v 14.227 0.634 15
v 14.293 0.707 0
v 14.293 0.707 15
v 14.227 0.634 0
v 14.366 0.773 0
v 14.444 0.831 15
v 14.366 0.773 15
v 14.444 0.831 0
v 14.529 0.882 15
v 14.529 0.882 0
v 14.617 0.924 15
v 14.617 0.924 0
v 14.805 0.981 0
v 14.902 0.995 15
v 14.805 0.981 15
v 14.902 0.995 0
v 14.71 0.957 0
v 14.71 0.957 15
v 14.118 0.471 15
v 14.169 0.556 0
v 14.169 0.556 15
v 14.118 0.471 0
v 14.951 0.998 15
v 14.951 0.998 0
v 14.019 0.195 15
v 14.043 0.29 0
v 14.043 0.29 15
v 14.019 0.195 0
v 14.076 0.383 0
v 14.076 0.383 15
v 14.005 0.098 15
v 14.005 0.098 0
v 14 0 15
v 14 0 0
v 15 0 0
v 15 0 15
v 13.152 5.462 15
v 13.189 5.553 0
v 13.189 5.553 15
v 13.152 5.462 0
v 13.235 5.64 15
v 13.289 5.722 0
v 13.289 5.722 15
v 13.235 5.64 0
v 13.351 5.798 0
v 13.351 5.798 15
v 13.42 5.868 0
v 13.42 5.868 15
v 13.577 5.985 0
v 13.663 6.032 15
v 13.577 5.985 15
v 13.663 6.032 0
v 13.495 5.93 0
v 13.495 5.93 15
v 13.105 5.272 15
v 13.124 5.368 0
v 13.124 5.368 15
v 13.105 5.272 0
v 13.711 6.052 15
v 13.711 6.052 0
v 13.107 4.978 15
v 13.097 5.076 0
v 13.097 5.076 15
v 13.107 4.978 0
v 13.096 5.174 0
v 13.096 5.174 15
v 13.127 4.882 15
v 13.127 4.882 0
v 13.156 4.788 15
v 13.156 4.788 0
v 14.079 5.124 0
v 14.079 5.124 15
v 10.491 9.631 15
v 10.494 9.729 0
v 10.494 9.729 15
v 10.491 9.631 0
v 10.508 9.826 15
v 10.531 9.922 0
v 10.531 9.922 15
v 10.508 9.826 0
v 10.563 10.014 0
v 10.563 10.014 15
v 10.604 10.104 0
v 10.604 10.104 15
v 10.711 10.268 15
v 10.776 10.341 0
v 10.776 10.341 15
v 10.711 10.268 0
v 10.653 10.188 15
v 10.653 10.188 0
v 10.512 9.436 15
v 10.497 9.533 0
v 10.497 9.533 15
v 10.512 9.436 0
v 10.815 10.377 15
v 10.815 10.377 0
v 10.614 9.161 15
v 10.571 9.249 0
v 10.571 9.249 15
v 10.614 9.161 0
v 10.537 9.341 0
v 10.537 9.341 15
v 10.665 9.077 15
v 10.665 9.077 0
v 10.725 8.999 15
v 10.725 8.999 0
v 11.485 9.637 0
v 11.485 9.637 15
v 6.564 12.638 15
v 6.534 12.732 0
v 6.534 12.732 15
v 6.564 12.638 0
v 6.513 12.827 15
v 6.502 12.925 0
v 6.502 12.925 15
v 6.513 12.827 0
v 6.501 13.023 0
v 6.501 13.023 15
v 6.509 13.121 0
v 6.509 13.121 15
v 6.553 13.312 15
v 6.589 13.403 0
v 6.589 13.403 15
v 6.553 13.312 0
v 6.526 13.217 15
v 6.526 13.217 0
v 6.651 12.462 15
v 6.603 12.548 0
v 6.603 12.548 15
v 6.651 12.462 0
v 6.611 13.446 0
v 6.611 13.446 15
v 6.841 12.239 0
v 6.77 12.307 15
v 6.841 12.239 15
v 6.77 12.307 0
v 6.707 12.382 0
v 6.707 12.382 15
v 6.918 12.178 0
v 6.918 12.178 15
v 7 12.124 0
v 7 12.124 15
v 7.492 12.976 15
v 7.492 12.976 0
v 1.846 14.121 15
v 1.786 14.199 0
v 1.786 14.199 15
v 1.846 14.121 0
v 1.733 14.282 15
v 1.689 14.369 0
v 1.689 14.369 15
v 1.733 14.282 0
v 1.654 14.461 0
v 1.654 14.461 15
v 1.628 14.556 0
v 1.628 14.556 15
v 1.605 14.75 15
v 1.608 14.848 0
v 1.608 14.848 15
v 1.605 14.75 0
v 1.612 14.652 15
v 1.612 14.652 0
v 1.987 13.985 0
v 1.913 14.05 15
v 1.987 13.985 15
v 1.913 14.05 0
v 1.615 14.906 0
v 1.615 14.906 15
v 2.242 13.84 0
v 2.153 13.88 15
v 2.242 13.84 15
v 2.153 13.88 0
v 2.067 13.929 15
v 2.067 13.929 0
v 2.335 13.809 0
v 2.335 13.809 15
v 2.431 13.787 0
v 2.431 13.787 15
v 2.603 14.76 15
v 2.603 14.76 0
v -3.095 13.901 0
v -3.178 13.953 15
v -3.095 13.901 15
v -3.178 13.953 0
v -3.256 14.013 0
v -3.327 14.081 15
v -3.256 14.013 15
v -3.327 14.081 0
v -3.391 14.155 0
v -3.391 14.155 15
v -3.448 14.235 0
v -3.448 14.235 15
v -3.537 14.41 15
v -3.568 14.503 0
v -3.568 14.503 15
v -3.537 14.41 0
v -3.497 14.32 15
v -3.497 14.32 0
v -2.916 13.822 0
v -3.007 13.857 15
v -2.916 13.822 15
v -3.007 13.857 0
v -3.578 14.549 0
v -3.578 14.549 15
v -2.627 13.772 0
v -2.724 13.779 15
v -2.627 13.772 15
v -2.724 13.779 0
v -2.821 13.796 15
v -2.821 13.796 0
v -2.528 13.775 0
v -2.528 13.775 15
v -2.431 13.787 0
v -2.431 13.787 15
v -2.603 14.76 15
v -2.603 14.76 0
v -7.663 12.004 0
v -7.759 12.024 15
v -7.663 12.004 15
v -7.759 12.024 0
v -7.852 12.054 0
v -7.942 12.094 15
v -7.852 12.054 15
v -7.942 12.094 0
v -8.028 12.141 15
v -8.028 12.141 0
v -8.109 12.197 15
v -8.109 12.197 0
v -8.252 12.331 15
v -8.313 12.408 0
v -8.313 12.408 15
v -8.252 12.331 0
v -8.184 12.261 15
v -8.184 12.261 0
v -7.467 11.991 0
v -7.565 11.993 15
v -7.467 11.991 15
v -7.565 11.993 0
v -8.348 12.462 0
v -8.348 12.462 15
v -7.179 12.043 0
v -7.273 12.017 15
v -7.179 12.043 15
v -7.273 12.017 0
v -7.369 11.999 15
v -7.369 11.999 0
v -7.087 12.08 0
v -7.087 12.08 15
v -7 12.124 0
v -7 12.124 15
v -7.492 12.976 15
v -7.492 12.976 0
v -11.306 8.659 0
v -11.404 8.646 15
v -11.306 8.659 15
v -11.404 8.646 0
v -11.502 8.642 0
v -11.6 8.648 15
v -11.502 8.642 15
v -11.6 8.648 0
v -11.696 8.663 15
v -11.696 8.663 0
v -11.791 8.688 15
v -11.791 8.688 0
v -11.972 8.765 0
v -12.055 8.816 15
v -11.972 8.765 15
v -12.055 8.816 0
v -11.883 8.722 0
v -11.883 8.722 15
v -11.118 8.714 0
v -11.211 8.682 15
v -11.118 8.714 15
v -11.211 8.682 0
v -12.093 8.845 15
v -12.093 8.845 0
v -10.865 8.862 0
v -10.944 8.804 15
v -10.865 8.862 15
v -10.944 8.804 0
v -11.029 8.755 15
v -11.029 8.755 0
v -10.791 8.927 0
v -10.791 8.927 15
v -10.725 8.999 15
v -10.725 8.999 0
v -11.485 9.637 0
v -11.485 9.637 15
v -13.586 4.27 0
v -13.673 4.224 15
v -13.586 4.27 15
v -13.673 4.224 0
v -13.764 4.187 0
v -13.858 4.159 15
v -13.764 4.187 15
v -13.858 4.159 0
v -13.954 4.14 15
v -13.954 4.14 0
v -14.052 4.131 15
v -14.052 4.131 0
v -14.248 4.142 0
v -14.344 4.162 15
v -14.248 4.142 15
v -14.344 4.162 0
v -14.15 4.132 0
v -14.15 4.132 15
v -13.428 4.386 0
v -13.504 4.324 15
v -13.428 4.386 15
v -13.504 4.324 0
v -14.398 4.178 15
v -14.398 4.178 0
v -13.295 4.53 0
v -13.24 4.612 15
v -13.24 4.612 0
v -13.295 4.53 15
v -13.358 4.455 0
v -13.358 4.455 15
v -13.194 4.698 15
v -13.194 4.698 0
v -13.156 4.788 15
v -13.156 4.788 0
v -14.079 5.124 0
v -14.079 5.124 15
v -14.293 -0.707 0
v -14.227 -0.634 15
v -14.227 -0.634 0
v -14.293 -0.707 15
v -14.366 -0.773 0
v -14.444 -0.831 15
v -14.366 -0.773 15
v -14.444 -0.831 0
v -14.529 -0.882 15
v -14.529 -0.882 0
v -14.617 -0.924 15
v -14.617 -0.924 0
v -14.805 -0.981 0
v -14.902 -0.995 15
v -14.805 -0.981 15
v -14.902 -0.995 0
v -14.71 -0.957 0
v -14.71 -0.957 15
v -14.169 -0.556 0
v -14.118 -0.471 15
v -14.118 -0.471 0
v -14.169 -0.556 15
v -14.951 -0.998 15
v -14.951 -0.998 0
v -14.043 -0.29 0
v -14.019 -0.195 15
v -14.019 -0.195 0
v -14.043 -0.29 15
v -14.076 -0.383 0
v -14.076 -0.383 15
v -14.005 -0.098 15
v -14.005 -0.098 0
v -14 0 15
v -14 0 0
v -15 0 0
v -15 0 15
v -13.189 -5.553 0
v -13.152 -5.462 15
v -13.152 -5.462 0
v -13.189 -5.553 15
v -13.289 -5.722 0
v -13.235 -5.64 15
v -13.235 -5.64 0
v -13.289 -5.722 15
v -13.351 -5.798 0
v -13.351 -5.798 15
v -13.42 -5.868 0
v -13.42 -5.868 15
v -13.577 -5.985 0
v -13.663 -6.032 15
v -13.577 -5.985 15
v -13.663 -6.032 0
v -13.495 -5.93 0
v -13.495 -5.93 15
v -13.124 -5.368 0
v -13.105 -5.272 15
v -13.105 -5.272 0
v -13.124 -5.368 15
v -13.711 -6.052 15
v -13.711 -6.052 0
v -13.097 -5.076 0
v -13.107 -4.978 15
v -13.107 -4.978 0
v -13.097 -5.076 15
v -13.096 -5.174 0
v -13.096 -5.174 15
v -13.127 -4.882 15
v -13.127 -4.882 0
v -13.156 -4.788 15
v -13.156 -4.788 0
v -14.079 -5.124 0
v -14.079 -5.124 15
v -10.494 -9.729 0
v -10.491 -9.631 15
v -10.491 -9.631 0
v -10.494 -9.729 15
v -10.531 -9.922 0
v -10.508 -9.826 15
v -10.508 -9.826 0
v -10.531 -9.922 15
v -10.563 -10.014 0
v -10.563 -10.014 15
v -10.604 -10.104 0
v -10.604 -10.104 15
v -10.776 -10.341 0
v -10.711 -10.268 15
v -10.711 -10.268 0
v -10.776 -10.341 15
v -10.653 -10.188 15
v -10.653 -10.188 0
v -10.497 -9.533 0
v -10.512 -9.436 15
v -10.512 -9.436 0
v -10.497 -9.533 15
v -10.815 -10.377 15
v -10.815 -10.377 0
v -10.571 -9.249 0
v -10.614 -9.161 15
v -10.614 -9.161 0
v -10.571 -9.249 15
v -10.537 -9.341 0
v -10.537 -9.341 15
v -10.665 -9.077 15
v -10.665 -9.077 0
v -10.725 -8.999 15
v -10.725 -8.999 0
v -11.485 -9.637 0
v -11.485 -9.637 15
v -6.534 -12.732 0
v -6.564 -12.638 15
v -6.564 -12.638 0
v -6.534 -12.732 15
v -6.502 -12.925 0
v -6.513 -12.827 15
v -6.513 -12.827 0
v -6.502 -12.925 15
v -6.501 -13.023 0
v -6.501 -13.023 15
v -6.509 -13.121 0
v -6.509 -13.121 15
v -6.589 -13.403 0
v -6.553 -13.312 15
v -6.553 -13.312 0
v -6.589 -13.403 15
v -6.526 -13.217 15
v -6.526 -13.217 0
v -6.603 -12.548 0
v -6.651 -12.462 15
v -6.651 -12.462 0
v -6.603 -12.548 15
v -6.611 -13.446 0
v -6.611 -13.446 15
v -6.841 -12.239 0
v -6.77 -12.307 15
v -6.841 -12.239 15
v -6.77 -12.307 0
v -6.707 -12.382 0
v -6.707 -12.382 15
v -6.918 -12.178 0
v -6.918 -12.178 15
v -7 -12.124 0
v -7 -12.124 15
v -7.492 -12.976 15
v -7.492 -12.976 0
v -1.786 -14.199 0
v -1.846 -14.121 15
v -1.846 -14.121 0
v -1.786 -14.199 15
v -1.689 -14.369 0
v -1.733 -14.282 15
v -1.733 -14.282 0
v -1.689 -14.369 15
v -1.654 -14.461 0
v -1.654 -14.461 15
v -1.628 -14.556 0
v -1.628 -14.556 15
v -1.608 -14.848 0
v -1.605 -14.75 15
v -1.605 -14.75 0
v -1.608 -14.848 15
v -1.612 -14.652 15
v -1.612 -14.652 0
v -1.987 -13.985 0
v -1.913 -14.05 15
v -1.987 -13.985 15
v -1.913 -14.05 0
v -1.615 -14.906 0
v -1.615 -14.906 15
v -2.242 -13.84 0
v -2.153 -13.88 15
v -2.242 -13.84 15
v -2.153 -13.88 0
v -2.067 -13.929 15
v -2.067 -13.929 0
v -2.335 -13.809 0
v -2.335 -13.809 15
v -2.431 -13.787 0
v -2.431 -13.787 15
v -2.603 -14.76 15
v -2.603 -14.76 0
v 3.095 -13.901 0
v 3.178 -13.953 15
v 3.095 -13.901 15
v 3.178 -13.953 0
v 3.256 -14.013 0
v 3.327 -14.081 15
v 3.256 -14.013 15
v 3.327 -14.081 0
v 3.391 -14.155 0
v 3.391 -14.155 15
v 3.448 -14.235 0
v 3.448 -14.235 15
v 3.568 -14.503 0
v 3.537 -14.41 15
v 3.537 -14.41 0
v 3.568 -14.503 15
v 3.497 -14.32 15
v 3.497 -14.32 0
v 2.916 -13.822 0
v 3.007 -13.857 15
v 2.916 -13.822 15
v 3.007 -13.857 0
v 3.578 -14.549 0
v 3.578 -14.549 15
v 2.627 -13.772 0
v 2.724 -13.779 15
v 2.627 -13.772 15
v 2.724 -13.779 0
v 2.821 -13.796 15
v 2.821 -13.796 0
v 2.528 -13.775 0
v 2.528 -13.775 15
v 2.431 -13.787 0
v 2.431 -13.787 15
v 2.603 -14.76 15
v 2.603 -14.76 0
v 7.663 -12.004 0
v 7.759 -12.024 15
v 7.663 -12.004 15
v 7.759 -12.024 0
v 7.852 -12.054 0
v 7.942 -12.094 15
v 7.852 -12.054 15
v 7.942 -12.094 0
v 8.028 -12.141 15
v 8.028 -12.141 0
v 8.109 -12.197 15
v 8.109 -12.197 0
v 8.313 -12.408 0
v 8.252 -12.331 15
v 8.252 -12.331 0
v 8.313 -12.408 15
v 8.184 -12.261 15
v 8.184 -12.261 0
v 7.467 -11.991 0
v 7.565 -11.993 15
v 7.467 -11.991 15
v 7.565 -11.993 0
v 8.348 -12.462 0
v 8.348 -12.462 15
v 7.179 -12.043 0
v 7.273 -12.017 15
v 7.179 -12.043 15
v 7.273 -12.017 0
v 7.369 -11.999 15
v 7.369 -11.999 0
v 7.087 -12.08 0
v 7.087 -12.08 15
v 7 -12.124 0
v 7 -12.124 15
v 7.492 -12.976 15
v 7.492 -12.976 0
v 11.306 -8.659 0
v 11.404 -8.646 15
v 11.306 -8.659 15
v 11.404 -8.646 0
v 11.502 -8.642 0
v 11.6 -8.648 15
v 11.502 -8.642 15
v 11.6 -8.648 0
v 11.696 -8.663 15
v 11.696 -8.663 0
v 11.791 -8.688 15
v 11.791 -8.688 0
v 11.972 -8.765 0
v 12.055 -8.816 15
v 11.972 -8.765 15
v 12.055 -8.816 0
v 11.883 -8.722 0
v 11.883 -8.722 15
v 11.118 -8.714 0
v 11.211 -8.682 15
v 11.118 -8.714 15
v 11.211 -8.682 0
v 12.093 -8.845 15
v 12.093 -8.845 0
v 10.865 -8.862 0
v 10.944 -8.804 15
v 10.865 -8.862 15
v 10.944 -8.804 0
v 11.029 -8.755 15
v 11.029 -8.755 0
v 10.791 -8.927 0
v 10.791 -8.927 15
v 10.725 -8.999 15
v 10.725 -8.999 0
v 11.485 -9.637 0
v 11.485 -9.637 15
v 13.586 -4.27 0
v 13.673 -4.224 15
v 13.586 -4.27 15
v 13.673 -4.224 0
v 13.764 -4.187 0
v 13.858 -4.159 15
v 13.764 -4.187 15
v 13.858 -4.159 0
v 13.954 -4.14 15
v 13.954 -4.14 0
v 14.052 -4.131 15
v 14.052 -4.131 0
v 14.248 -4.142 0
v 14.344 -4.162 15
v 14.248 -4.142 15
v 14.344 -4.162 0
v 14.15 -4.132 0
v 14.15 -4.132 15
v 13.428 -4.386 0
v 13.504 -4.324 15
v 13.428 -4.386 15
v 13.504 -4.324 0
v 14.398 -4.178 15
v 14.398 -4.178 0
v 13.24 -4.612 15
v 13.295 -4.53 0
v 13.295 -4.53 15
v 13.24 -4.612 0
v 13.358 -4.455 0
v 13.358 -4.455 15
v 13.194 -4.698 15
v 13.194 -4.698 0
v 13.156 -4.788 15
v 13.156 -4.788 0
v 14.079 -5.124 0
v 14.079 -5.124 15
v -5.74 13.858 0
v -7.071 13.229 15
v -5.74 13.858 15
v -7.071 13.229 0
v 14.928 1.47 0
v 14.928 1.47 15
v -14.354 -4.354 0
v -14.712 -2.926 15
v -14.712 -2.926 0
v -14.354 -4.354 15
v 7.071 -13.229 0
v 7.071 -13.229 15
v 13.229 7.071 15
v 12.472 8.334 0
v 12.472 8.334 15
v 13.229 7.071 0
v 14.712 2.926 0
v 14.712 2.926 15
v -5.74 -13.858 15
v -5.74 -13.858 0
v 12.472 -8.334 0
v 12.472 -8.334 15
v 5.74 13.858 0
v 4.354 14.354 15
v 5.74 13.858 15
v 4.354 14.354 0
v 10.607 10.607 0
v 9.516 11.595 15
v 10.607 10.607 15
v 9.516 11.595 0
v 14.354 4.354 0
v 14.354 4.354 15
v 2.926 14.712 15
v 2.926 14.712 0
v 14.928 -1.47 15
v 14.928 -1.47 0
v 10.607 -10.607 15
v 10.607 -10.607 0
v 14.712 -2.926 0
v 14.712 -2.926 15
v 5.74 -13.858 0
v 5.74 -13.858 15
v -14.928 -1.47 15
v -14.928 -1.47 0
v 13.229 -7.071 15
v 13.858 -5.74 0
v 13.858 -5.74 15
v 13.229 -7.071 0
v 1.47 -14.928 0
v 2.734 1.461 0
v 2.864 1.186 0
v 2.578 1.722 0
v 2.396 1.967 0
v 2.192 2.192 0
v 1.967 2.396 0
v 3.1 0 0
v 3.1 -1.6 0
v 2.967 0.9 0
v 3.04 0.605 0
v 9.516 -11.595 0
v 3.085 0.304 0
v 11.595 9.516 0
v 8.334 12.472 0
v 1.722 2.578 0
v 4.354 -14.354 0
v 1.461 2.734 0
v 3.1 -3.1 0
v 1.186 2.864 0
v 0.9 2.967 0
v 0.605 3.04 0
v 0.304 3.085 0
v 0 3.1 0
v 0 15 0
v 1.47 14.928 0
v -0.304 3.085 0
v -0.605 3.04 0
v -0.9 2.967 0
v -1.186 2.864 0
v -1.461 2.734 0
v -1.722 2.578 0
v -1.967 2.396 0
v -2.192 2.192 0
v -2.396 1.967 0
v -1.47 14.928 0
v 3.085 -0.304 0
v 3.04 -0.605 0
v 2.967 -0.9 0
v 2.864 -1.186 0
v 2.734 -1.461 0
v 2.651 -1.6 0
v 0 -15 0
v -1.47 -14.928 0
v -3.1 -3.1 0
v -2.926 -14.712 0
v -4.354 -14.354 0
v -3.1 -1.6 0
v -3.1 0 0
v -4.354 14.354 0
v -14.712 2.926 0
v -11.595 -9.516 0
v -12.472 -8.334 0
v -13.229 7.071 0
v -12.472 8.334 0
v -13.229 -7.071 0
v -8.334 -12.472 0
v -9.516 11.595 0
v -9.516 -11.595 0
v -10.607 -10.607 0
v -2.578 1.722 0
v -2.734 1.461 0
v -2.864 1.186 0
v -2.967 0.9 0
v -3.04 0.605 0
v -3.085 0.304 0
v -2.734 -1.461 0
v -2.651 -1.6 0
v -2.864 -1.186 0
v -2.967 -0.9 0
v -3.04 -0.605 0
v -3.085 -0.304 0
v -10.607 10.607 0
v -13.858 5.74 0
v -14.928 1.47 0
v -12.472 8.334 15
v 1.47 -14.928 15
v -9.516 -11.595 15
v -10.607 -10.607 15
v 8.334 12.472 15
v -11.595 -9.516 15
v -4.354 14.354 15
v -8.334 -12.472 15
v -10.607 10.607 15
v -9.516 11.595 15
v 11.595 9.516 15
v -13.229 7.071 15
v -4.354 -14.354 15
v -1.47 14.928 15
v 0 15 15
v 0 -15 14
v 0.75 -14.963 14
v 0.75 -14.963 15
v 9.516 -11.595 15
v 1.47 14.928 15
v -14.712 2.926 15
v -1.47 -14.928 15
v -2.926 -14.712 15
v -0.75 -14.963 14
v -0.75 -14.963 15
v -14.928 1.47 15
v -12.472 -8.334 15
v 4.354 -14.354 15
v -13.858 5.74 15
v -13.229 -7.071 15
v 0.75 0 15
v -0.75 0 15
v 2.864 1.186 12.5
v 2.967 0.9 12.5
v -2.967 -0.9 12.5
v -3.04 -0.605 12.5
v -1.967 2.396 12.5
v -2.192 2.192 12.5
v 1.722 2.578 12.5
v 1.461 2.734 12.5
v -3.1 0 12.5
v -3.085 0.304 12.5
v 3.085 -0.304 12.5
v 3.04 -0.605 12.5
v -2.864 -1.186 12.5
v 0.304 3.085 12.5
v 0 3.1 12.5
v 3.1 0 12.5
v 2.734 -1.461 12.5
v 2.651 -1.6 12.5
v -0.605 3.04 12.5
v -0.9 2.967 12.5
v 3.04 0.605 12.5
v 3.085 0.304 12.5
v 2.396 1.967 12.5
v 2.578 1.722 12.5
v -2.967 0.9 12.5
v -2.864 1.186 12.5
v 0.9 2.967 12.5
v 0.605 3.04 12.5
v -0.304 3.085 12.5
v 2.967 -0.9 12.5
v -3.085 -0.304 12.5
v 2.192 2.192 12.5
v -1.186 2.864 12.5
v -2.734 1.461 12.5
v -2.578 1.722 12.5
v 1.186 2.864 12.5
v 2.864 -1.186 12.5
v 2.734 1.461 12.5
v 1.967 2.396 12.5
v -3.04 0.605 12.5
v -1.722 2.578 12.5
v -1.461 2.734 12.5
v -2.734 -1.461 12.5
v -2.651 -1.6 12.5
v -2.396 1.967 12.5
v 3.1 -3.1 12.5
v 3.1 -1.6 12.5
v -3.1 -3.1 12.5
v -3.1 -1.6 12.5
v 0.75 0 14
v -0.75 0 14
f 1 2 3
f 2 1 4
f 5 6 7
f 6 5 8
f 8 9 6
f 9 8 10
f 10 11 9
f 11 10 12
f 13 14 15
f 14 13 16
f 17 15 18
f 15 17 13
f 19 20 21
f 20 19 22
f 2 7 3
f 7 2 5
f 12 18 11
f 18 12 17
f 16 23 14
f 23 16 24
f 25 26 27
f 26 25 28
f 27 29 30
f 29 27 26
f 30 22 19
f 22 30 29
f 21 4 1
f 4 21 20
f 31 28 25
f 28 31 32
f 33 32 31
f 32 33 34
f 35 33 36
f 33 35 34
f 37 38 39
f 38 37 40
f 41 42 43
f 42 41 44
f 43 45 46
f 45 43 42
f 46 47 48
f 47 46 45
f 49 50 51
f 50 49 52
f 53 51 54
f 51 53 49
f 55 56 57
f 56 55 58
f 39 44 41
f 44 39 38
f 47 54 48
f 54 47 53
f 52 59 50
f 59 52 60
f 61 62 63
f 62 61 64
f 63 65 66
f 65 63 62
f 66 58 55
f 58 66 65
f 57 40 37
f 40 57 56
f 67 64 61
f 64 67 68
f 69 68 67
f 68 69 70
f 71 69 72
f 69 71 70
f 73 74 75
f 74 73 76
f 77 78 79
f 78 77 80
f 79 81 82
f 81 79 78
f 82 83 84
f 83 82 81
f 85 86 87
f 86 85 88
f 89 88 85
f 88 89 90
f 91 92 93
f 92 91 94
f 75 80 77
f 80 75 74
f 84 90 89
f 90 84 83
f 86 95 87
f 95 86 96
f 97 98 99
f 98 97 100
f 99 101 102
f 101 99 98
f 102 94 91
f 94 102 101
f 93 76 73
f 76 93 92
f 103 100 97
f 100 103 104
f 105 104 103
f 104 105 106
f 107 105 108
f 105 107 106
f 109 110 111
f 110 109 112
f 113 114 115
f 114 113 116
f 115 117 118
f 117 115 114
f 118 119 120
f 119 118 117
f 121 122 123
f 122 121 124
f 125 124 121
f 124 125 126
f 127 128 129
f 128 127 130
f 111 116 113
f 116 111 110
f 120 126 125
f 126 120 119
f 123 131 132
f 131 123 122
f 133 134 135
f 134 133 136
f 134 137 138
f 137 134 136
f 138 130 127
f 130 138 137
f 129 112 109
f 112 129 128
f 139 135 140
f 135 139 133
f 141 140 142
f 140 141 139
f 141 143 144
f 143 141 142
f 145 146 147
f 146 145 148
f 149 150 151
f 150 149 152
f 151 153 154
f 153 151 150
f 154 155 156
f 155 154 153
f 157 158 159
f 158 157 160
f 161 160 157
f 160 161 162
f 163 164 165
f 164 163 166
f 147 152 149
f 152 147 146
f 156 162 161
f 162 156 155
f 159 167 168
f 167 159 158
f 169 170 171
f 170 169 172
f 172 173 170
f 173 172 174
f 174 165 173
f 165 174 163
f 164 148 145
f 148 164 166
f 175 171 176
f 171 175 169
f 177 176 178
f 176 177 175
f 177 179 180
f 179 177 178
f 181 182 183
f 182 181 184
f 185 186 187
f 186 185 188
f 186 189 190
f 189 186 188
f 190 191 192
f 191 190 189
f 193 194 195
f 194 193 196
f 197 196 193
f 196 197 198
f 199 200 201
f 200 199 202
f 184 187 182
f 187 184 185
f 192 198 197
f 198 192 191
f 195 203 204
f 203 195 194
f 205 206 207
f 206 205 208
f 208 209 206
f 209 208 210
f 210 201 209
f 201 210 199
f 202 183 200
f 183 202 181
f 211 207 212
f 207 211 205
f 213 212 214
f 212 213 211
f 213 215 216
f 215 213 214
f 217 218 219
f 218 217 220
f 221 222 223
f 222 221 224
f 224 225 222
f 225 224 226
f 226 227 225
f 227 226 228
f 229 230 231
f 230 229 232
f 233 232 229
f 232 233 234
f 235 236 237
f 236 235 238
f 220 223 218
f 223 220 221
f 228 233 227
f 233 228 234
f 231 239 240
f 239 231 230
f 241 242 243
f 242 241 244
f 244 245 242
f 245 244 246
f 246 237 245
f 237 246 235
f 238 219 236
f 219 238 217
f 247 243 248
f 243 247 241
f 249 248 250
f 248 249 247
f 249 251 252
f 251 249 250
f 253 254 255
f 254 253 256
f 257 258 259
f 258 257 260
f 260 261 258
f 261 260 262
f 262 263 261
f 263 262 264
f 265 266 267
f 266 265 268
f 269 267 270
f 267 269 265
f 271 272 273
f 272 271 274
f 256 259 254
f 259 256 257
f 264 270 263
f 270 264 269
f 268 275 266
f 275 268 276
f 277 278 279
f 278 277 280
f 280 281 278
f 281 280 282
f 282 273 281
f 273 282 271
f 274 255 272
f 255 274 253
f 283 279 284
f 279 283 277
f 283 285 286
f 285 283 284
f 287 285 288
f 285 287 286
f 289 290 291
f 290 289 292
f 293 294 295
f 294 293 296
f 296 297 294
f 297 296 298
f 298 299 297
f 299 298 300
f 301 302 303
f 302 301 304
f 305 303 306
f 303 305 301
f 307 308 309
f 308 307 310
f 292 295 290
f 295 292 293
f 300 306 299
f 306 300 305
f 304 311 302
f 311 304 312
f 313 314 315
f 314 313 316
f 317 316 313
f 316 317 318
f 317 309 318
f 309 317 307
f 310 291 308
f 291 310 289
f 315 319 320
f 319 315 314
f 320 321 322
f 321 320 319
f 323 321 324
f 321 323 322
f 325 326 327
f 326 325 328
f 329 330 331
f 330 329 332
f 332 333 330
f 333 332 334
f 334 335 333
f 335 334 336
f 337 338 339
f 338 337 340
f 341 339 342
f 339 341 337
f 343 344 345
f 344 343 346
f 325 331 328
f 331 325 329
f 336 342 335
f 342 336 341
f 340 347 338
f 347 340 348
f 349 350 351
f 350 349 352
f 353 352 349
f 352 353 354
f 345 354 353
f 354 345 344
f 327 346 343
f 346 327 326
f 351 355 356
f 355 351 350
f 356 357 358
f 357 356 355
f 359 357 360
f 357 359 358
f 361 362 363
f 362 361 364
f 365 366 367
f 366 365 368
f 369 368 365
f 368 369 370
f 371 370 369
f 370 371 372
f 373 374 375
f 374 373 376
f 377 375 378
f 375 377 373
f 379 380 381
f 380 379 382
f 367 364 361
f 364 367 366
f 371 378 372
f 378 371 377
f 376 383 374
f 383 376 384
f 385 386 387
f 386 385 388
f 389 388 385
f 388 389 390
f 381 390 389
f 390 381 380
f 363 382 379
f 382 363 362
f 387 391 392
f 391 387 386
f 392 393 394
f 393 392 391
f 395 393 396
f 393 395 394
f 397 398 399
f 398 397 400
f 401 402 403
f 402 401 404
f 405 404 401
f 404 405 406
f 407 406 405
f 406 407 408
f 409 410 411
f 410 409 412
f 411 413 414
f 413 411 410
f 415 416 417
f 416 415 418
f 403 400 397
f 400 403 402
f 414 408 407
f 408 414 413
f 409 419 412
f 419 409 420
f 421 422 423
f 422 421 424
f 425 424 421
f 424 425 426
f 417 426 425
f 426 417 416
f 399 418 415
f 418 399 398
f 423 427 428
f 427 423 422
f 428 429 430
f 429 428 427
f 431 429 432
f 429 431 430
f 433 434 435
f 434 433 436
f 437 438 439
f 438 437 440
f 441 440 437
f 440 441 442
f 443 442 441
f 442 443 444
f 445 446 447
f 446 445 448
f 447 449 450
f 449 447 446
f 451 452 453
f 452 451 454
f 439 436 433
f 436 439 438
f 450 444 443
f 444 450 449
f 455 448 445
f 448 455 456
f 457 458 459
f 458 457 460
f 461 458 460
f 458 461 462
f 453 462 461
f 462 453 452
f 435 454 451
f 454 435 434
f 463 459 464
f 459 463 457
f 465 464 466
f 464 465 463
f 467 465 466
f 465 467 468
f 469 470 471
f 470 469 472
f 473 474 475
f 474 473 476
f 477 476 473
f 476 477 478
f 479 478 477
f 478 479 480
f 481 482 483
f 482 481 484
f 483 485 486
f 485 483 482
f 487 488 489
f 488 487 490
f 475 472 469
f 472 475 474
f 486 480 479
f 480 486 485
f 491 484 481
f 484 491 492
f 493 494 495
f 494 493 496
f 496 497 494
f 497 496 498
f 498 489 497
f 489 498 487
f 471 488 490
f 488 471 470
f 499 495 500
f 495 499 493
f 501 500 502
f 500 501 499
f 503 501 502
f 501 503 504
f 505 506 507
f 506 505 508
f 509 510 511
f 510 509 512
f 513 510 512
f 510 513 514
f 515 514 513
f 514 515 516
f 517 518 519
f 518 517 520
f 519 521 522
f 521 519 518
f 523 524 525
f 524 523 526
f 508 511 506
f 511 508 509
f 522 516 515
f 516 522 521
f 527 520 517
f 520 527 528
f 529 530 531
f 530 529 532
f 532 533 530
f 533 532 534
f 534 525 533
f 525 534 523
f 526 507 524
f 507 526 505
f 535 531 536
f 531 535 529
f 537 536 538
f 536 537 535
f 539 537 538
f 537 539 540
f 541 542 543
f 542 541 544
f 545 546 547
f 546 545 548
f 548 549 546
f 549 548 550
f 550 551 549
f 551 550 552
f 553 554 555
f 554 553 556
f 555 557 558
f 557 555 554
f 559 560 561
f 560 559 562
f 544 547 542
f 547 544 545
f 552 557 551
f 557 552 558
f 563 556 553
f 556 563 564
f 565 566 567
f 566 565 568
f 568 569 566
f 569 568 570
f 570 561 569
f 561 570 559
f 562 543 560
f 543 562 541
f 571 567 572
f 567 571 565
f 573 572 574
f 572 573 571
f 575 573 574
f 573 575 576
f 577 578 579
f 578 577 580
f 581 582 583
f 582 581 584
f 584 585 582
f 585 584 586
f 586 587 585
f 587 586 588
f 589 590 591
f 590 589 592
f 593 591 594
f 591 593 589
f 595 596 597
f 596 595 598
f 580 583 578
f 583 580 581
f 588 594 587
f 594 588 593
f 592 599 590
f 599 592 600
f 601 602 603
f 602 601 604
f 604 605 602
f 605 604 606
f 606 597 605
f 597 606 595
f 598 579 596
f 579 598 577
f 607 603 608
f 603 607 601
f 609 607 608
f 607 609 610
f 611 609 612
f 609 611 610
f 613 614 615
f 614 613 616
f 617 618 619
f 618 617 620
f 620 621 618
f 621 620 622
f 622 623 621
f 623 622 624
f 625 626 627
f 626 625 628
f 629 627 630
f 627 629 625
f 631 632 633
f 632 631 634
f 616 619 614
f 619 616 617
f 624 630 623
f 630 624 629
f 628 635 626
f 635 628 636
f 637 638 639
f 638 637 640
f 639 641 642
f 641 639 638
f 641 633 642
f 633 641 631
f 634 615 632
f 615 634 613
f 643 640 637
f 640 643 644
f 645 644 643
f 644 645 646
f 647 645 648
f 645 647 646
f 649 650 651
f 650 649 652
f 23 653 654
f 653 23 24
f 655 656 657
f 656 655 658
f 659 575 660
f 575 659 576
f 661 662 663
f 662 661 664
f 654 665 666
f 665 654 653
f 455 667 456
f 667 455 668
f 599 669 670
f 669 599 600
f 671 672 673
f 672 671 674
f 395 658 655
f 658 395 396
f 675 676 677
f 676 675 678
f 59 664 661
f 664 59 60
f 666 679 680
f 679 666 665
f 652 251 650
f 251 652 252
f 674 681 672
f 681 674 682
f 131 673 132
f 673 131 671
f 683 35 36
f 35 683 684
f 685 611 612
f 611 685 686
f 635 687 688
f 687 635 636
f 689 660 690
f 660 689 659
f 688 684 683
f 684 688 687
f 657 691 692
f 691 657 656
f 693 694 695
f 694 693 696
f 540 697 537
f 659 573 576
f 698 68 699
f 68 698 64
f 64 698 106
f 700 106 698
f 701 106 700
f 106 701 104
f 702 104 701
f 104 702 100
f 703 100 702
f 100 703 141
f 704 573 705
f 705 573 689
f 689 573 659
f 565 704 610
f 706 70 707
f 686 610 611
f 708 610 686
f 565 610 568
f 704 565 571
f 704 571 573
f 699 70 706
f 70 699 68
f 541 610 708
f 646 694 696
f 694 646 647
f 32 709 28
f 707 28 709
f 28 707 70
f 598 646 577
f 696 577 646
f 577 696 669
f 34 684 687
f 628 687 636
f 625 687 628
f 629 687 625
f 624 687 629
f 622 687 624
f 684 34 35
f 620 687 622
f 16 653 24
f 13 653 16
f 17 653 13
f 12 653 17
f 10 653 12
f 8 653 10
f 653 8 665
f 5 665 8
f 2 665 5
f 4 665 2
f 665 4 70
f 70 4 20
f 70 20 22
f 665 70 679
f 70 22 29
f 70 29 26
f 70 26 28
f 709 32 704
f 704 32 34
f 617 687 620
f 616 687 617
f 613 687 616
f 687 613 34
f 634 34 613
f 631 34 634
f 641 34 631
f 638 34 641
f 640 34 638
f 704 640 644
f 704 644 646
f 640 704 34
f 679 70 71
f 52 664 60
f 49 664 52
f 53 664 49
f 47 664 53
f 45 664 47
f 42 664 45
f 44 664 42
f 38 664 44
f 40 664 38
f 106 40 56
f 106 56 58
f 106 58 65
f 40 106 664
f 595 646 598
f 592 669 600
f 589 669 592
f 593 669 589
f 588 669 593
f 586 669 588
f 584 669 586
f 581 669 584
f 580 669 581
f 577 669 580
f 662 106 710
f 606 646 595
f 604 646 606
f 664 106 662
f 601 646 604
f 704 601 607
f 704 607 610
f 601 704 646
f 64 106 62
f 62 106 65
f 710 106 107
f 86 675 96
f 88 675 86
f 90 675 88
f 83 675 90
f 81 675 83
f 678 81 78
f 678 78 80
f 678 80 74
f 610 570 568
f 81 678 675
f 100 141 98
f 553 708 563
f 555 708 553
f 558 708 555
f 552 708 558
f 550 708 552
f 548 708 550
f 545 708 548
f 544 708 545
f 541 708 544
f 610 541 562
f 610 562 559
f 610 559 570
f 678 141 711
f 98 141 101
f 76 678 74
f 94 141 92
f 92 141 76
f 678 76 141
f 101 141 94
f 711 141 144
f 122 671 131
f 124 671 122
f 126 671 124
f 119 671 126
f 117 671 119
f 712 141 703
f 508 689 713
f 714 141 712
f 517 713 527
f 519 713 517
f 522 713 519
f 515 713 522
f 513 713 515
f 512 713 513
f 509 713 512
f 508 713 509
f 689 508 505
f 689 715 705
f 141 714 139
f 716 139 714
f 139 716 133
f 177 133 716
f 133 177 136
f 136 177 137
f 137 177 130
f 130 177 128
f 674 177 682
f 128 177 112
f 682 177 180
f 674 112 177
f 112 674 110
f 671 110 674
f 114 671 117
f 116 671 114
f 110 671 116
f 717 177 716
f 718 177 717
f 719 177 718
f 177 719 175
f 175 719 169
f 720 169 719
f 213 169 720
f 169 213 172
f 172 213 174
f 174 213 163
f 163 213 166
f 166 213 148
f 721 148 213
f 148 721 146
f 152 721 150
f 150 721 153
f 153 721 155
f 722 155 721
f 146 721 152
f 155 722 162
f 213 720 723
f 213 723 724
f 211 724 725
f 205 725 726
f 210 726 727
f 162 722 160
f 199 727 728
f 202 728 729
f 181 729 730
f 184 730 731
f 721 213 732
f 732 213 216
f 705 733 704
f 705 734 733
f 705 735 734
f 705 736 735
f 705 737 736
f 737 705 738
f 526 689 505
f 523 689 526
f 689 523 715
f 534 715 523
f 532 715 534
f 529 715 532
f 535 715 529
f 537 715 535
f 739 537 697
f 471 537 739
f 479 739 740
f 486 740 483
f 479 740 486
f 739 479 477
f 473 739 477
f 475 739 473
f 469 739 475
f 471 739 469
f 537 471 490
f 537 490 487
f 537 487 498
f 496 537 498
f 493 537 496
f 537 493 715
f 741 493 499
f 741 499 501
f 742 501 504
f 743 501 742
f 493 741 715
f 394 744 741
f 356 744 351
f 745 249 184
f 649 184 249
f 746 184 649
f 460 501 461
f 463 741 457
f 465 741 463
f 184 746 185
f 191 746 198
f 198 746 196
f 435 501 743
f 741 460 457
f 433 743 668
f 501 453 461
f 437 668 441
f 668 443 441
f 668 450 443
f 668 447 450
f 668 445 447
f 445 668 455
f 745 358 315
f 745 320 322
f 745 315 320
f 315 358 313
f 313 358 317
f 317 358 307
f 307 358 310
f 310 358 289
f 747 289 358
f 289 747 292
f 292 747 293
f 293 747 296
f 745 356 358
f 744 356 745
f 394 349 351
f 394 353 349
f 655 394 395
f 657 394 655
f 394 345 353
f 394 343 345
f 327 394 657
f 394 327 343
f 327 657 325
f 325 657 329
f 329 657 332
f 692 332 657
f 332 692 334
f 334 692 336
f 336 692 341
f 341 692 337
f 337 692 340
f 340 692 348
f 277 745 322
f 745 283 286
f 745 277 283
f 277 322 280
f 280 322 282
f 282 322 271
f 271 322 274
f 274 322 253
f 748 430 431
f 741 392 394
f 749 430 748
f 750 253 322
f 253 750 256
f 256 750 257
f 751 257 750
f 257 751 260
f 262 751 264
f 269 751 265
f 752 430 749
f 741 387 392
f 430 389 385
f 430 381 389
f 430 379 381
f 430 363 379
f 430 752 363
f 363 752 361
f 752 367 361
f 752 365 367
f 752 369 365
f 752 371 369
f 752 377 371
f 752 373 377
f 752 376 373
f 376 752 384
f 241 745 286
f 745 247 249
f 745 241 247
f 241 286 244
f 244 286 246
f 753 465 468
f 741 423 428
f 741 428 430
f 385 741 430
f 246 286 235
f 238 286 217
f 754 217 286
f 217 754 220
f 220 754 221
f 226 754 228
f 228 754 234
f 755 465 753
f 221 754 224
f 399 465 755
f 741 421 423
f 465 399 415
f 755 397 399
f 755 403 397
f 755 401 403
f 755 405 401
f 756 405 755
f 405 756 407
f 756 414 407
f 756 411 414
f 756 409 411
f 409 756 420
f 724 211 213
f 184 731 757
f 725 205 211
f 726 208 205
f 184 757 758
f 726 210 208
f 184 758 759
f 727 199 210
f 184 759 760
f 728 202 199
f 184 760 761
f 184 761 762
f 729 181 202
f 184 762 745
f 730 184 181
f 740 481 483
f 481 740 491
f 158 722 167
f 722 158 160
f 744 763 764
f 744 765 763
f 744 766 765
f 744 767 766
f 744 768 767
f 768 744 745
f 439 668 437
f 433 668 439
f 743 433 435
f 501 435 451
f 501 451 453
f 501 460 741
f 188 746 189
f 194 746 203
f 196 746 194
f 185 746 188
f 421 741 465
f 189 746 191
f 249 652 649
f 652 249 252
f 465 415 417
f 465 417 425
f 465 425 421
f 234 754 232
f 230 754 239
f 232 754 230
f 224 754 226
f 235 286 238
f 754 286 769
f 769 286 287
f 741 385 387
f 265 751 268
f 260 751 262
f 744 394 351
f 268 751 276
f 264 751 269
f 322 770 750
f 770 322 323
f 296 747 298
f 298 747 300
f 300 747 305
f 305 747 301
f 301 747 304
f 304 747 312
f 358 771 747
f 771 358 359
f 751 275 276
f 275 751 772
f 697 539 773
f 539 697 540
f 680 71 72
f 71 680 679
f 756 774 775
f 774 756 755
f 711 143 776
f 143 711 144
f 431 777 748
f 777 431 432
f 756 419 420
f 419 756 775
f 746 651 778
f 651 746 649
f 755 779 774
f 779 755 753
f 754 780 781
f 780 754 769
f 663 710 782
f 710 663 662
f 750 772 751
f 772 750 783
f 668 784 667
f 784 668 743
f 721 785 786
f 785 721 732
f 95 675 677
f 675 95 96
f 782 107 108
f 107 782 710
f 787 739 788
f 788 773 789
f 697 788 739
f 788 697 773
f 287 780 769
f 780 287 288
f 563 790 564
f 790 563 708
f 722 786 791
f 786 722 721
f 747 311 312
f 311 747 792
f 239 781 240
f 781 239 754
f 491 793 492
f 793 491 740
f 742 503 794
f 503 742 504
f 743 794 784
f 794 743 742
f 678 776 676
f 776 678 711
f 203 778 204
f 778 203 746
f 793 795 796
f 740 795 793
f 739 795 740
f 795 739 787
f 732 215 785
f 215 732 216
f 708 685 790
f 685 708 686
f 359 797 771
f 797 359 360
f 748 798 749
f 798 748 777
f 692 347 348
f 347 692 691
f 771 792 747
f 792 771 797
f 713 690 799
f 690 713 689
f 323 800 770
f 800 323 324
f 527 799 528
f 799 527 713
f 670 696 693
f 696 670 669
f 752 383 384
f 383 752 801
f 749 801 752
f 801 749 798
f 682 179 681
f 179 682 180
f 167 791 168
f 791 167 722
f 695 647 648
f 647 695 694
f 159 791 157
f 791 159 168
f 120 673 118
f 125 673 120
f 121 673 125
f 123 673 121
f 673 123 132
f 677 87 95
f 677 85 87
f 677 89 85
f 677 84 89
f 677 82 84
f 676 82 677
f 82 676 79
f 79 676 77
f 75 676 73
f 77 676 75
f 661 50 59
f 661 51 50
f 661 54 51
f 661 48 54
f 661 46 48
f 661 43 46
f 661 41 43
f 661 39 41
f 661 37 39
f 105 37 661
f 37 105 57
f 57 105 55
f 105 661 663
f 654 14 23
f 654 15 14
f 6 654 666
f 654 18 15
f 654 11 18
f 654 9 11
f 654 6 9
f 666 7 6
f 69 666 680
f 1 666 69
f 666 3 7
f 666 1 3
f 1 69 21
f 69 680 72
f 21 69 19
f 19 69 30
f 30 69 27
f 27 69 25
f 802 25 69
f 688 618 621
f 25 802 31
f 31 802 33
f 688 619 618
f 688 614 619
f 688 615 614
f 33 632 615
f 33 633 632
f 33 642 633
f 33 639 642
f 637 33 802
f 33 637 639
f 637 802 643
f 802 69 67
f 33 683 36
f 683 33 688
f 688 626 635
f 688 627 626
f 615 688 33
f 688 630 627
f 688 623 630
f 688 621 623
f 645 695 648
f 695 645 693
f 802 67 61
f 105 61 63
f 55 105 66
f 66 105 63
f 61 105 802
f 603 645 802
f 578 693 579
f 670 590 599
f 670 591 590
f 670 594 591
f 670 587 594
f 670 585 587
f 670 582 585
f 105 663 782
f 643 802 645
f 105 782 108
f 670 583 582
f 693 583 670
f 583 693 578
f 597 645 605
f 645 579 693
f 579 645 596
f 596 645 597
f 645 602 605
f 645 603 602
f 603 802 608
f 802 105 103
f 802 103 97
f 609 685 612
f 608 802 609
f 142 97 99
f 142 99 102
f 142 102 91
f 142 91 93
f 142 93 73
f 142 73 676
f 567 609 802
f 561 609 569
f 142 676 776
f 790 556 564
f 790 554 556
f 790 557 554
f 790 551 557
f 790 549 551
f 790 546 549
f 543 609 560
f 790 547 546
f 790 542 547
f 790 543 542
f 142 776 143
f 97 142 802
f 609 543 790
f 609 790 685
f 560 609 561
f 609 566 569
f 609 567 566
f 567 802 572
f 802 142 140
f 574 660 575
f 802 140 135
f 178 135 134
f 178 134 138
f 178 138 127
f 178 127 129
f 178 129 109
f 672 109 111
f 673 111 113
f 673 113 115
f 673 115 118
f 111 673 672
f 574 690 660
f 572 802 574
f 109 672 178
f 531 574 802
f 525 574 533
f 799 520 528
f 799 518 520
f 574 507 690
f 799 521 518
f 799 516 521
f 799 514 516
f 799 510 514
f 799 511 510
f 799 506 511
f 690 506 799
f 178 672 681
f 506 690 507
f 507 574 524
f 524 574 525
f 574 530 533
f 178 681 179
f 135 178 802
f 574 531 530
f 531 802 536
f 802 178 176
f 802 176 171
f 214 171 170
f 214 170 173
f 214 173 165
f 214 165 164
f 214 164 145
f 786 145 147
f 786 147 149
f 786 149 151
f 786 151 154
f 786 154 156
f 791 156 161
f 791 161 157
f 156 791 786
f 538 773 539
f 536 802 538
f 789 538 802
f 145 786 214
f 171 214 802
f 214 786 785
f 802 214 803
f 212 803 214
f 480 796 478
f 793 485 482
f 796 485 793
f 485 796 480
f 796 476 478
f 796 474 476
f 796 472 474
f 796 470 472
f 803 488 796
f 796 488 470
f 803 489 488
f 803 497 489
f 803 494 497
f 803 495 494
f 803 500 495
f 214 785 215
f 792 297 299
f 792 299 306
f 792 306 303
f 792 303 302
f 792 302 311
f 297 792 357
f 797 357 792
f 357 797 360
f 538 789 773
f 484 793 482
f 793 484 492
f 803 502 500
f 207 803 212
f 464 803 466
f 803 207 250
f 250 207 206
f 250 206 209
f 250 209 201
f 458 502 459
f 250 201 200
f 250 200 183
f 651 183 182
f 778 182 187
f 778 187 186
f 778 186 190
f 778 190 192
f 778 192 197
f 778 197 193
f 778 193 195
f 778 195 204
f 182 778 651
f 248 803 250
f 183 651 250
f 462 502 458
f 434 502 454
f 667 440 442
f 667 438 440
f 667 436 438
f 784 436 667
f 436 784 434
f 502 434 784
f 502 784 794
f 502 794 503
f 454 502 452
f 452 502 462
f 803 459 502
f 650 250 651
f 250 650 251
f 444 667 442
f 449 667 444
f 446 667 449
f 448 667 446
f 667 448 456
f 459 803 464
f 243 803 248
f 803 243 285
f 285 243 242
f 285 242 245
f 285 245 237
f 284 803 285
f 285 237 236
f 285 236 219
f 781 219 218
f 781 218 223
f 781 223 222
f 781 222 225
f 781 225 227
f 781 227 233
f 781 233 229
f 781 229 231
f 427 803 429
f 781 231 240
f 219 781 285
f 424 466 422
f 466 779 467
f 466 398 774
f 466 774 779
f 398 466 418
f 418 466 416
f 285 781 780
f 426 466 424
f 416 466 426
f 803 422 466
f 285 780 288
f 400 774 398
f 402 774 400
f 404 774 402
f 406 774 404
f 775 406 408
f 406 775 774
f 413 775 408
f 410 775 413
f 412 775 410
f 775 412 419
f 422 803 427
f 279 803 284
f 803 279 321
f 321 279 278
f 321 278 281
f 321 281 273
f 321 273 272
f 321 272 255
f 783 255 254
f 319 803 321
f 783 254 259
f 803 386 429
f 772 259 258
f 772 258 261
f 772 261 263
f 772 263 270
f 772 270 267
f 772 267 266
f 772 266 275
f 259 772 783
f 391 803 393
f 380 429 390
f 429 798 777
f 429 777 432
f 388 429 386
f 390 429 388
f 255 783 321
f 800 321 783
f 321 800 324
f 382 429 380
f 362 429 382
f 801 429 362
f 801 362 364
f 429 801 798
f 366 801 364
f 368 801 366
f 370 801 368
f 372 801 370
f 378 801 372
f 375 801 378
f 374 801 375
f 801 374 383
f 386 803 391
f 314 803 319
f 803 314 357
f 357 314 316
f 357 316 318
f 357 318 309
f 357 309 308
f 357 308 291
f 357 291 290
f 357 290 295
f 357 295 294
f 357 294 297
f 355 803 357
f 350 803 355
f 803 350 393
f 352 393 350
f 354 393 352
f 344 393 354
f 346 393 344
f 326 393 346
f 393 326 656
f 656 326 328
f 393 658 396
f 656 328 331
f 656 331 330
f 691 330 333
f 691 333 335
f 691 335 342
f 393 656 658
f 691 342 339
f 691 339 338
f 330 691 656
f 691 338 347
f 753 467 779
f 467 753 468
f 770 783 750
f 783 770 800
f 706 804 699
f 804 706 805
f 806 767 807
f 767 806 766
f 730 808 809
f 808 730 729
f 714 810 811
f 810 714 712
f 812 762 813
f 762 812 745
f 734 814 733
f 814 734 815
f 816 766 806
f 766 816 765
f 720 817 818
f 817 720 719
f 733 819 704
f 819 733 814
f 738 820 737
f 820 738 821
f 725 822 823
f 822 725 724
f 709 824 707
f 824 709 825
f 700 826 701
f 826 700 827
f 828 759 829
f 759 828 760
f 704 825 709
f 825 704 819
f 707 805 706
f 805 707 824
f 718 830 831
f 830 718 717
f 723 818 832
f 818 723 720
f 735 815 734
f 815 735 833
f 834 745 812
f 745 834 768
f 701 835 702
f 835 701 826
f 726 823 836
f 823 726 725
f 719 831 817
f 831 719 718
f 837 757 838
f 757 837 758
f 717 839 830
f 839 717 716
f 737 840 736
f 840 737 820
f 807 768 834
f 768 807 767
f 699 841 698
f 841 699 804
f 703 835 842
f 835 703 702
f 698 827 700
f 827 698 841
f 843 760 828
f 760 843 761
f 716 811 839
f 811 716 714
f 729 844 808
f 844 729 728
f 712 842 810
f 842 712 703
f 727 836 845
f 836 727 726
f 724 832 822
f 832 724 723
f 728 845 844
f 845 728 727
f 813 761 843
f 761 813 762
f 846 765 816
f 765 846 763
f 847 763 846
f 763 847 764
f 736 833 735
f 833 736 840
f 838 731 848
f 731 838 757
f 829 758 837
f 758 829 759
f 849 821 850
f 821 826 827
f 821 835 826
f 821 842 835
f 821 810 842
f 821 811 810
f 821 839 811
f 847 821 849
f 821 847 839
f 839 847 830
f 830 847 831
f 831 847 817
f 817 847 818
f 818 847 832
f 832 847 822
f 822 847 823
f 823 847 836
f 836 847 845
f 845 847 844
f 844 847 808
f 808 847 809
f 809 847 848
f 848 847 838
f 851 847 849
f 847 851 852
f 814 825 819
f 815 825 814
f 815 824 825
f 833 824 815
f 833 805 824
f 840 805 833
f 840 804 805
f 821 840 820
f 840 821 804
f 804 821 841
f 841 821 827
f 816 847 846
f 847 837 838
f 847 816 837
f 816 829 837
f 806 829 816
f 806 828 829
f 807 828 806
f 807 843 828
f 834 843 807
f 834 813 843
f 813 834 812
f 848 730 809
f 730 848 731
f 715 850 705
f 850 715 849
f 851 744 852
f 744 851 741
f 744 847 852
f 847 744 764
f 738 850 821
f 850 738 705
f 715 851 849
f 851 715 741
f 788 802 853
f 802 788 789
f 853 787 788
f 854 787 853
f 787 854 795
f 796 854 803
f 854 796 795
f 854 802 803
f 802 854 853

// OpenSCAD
// Hotplate stirrer knob with 6mm D-shaft replacement

// === DIMENSIONS ===
knob_diameter = 30;        // Outer diameter (mm)
knob_height = 15;          // Height (mm)
d_diameter = 6.2;          // D-shaft circle diameter (mm)
d_radius = d_diameter / 2; // 3.1 mm
d_hole_depth = 12;         // D-hole depth from bottom (mm)
d_flat_distance = 1.6;     // Distance from flat to opposite edge (mm)
grip_grooves = 18;         // Number of grip grooves
groove_diameter = 2;       // Grip groove diameter (mm)
groove_radius = groove_diameter / 2; // 1 mm
indicator_width = 1.5;     // Top indicator groove width (mm)
indicator_depth = 1;       // Top indicator groove depth (mm)

$fn = 64;

difference() {
    // === MAIN BODY ===
    cylinder(h = knob_height, r = knob_diameter / 2);
    
    // === D-SHAPED HOLE ===
    // Cylindrical part of D
    cylinder(h = d_hole_depth + 0.5, r = d_radius);
    
    // Flat side of D (positioned to cut the entire hole depth)
    // Top edge at y = -1.6, bottom edge at y = -3.1
    // Centered at z = d_hole_depth/2 to extend from z = -0.5 to z = 12.5
    translate([0, -2.35, d_hole_depth / 2])
        cube([d_diameter, 1.5, d_hole_depth + 1], center = true);
    
    // === GRIP GROOVES (18 vertical half-cylinders around circumference) ===
    for (i = [0:grip_grooves - 1]) {
        angle = i * 360 / grip_grooves;
        rotate([0, 0, angle]) {
            translate([knob_diameter / 2, 0, knob_height / 2]) {
                // Create half-cylinder by removing half of a full cylinder
                difference() {
                    cylinder(h = knob_height + 1, r = groove_radius, center = true);
                    // Remove top half to create half-cylinder
                    translate([0, -groove_radius / 2, 0])
                        cube([groove_radius * 3, groove_radius, knob_height + 2], center = true);
                }
            }
        }
    }
    
    // === INDICATOR GROOVE (on top surface) ===
    // 1.5 mm wide, 1 mm deep, radial groove from center to edge
    // Oriented toward the flat side of D (negative Y direction)
    translate([0, -knob_diameter / 2 / 2, knob_height - indicator_depth / 2])
        cube([indicator_width, knob_diameter / 2, indicator_depth], center = true);
}
